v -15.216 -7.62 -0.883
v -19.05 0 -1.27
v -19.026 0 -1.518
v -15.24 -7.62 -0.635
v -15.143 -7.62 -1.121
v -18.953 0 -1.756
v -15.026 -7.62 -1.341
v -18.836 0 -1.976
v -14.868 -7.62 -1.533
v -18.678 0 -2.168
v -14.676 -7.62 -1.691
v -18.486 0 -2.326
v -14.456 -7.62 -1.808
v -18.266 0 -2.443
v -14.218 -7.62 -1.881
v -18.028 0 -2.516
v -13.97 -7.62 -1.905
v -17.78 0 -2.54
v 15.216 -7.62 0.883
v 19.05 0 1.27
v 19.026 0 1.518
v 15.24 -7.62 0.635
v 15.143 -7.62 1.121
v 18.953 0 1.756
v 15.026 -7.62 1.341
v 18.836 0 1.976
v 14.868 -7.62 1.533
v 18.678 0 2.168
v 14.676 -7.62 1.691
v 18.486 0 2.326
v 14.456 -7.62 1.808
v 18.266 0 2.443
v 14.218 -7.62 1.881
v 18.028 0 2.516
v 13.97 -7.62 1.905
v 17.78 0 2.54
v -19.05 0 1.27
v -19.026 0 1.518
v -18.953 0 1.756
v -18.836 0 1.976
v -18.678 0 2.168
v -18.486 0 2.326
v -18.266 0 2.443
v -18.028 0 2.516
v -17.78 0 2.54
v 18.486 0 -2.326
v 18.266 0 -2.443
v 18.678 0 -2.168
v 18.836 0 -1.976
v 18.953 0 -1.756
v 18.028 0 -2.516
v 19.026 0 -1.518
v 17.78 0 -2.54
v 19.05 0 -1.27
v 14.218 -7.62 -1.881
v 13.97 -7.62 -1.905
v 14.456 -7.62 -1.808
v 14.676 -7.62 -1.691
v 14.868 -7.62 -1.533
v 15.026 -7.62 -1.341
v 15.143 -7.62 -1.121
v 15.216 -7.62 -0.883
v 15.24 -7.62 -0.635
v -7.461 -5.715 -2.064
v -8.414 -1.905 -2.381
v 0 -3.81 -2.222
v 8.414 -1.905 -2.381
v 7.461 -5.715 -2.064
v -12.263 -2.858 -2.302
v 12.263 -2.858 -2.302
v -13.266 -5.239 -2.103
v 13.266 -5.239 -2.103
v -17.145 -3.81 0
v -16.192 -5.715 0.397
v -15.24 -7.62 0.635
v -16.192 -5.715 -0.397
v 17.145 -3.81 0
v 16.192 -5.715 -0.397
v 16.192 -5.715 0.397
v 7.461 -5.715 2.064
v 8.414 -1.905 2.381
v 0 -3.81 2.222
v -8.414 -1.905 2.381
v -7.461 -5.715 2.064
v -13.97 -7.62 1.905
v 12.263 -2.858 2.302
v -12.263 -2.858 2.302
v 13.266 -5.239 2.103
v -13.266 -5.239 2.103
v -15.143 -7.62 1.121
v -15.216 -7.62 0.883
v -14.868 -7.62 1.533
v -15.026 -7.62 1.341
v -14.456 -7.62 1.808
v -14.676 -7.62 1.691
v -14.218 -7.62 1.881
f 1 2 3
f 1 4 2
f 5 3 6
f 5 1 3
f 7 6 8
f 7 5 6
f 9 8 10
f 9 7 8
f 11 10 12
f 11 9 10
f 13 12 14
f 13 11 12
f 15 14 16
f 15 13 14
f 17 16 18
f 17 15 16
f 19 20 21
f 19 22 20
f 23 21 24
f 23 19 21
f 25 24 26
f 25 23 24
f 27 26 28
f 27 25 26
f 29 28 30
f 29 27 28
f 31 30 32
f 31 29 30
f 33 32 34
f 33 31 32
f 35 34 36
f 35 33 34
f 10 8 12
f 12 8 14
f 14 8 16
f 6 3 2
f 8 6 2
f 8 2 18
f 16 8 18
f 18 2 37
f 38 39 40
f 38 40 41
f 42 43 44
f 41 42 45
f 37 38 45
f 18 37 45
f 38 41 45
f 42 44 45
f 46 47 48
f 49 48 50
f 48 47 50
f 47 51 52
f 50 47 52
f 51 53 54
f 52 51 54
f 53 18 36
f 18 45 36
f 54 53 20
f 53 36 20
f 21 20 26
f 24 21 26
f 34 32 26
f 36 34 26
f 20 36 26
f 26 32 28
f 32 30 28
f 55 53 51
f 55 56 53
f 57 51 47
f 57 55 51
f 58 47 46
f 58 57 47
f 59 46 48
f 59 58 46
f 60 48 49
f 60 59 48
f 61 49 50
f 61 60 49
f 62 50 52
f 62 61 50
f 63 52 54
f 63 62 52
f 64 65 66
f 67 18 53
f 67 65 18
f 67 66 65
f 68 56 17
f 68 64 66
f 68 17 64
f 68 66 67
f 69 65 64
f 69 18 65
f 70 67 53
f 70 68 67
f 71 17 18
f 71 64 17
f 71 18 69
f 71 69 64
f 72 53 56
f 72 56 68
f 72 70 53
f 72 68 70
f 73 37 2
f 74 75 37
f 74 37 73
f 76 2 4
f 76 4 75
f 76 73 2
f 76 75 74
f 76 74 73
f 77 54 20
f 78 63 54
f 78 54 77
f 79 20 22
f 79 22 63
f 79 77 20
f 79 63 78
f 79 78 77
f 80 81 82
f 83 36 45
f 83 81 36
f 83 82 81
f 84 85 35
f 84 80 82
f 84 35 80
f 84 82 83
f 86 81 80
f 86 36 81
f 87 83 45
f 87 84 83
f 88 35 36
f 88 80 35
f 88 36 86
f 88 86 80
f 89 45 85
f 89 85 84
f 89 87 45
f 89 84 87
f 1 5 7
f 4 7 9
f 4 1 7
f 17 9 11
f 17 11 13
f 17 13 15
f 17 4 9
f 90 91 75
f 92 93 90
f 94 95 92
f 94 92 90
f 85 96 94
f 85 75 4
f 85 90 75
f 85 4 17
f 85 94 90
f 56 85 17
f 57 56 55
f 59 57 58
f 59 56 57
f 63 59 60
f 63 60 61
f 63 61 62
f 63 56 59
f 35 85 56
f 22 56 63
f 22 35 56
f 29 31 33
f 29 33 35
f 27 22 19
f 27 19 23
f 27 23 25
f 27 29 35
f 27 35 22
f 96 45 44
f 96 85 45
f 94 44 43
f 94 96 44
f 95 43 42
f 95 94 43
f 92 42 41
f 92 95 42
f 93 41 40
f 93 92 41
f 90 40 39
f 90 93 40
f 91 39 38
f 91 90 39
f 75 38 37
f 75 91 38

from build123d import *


with BuildPart() as f3:
    # F0 (on Front) → F3 section 0
    with BuildSketch(Plane.XZ):
        with BuildLine():
            ThreePointArc((19.05, 1.27), (18.678026, 2.168026), (17.78, 2.54))
            Line((17.78, 2.54), (-17.78, 2.54))
            ThreePointArc((-17.78, 2.54), (-18.678026, 2.168026), (-19.05, 1.27))
            Line((-19.05, 1.27), (-19.05, -1.27))
            ThreePointArc((-19.05, -1.27), (-18.678026, -2.168026), (-17.78, -2.54))
            Line((-17.78, -2.54), (17.78, -2.54))
            ThreePointArc((17.78, -2.54), (18.678026, -2.168026), (19.05, -1.27))
            Line((19.05, -1.27), (19.05, 1.27))
        make_face()
    # F2 (on offset) → F3 section 1
    with BuildSketch(Plane.XZ.offset(7.62)):
        with BuildLine():
            ThreePointArc((15.24, 0.635), (14.868026, 1.533026), (13.97, 1.905))
            Line((13.97, 1.905), (-13.97, 1.905))
            ThreePointArc((-13.97, 1.905), (-14.868026, 1.533026), (-15.24, 0.635))
            Line((-15.24, 0.635), (-15.24, -0.635))
            ThreePointArc((-15.24, -0.635), (-14.868026, -1.533026), (-13.97, -1.905))
            Line((-13.97, -1.905), (13.97, -1.905))
            ThreePointArc((13.97, -1.905), (14.868026, -1.533026), (15.24, -0.635))
            Line((15.24, -0.635), (15.24, 0.635))
        make_face()
    loft()


solid = f3.part
